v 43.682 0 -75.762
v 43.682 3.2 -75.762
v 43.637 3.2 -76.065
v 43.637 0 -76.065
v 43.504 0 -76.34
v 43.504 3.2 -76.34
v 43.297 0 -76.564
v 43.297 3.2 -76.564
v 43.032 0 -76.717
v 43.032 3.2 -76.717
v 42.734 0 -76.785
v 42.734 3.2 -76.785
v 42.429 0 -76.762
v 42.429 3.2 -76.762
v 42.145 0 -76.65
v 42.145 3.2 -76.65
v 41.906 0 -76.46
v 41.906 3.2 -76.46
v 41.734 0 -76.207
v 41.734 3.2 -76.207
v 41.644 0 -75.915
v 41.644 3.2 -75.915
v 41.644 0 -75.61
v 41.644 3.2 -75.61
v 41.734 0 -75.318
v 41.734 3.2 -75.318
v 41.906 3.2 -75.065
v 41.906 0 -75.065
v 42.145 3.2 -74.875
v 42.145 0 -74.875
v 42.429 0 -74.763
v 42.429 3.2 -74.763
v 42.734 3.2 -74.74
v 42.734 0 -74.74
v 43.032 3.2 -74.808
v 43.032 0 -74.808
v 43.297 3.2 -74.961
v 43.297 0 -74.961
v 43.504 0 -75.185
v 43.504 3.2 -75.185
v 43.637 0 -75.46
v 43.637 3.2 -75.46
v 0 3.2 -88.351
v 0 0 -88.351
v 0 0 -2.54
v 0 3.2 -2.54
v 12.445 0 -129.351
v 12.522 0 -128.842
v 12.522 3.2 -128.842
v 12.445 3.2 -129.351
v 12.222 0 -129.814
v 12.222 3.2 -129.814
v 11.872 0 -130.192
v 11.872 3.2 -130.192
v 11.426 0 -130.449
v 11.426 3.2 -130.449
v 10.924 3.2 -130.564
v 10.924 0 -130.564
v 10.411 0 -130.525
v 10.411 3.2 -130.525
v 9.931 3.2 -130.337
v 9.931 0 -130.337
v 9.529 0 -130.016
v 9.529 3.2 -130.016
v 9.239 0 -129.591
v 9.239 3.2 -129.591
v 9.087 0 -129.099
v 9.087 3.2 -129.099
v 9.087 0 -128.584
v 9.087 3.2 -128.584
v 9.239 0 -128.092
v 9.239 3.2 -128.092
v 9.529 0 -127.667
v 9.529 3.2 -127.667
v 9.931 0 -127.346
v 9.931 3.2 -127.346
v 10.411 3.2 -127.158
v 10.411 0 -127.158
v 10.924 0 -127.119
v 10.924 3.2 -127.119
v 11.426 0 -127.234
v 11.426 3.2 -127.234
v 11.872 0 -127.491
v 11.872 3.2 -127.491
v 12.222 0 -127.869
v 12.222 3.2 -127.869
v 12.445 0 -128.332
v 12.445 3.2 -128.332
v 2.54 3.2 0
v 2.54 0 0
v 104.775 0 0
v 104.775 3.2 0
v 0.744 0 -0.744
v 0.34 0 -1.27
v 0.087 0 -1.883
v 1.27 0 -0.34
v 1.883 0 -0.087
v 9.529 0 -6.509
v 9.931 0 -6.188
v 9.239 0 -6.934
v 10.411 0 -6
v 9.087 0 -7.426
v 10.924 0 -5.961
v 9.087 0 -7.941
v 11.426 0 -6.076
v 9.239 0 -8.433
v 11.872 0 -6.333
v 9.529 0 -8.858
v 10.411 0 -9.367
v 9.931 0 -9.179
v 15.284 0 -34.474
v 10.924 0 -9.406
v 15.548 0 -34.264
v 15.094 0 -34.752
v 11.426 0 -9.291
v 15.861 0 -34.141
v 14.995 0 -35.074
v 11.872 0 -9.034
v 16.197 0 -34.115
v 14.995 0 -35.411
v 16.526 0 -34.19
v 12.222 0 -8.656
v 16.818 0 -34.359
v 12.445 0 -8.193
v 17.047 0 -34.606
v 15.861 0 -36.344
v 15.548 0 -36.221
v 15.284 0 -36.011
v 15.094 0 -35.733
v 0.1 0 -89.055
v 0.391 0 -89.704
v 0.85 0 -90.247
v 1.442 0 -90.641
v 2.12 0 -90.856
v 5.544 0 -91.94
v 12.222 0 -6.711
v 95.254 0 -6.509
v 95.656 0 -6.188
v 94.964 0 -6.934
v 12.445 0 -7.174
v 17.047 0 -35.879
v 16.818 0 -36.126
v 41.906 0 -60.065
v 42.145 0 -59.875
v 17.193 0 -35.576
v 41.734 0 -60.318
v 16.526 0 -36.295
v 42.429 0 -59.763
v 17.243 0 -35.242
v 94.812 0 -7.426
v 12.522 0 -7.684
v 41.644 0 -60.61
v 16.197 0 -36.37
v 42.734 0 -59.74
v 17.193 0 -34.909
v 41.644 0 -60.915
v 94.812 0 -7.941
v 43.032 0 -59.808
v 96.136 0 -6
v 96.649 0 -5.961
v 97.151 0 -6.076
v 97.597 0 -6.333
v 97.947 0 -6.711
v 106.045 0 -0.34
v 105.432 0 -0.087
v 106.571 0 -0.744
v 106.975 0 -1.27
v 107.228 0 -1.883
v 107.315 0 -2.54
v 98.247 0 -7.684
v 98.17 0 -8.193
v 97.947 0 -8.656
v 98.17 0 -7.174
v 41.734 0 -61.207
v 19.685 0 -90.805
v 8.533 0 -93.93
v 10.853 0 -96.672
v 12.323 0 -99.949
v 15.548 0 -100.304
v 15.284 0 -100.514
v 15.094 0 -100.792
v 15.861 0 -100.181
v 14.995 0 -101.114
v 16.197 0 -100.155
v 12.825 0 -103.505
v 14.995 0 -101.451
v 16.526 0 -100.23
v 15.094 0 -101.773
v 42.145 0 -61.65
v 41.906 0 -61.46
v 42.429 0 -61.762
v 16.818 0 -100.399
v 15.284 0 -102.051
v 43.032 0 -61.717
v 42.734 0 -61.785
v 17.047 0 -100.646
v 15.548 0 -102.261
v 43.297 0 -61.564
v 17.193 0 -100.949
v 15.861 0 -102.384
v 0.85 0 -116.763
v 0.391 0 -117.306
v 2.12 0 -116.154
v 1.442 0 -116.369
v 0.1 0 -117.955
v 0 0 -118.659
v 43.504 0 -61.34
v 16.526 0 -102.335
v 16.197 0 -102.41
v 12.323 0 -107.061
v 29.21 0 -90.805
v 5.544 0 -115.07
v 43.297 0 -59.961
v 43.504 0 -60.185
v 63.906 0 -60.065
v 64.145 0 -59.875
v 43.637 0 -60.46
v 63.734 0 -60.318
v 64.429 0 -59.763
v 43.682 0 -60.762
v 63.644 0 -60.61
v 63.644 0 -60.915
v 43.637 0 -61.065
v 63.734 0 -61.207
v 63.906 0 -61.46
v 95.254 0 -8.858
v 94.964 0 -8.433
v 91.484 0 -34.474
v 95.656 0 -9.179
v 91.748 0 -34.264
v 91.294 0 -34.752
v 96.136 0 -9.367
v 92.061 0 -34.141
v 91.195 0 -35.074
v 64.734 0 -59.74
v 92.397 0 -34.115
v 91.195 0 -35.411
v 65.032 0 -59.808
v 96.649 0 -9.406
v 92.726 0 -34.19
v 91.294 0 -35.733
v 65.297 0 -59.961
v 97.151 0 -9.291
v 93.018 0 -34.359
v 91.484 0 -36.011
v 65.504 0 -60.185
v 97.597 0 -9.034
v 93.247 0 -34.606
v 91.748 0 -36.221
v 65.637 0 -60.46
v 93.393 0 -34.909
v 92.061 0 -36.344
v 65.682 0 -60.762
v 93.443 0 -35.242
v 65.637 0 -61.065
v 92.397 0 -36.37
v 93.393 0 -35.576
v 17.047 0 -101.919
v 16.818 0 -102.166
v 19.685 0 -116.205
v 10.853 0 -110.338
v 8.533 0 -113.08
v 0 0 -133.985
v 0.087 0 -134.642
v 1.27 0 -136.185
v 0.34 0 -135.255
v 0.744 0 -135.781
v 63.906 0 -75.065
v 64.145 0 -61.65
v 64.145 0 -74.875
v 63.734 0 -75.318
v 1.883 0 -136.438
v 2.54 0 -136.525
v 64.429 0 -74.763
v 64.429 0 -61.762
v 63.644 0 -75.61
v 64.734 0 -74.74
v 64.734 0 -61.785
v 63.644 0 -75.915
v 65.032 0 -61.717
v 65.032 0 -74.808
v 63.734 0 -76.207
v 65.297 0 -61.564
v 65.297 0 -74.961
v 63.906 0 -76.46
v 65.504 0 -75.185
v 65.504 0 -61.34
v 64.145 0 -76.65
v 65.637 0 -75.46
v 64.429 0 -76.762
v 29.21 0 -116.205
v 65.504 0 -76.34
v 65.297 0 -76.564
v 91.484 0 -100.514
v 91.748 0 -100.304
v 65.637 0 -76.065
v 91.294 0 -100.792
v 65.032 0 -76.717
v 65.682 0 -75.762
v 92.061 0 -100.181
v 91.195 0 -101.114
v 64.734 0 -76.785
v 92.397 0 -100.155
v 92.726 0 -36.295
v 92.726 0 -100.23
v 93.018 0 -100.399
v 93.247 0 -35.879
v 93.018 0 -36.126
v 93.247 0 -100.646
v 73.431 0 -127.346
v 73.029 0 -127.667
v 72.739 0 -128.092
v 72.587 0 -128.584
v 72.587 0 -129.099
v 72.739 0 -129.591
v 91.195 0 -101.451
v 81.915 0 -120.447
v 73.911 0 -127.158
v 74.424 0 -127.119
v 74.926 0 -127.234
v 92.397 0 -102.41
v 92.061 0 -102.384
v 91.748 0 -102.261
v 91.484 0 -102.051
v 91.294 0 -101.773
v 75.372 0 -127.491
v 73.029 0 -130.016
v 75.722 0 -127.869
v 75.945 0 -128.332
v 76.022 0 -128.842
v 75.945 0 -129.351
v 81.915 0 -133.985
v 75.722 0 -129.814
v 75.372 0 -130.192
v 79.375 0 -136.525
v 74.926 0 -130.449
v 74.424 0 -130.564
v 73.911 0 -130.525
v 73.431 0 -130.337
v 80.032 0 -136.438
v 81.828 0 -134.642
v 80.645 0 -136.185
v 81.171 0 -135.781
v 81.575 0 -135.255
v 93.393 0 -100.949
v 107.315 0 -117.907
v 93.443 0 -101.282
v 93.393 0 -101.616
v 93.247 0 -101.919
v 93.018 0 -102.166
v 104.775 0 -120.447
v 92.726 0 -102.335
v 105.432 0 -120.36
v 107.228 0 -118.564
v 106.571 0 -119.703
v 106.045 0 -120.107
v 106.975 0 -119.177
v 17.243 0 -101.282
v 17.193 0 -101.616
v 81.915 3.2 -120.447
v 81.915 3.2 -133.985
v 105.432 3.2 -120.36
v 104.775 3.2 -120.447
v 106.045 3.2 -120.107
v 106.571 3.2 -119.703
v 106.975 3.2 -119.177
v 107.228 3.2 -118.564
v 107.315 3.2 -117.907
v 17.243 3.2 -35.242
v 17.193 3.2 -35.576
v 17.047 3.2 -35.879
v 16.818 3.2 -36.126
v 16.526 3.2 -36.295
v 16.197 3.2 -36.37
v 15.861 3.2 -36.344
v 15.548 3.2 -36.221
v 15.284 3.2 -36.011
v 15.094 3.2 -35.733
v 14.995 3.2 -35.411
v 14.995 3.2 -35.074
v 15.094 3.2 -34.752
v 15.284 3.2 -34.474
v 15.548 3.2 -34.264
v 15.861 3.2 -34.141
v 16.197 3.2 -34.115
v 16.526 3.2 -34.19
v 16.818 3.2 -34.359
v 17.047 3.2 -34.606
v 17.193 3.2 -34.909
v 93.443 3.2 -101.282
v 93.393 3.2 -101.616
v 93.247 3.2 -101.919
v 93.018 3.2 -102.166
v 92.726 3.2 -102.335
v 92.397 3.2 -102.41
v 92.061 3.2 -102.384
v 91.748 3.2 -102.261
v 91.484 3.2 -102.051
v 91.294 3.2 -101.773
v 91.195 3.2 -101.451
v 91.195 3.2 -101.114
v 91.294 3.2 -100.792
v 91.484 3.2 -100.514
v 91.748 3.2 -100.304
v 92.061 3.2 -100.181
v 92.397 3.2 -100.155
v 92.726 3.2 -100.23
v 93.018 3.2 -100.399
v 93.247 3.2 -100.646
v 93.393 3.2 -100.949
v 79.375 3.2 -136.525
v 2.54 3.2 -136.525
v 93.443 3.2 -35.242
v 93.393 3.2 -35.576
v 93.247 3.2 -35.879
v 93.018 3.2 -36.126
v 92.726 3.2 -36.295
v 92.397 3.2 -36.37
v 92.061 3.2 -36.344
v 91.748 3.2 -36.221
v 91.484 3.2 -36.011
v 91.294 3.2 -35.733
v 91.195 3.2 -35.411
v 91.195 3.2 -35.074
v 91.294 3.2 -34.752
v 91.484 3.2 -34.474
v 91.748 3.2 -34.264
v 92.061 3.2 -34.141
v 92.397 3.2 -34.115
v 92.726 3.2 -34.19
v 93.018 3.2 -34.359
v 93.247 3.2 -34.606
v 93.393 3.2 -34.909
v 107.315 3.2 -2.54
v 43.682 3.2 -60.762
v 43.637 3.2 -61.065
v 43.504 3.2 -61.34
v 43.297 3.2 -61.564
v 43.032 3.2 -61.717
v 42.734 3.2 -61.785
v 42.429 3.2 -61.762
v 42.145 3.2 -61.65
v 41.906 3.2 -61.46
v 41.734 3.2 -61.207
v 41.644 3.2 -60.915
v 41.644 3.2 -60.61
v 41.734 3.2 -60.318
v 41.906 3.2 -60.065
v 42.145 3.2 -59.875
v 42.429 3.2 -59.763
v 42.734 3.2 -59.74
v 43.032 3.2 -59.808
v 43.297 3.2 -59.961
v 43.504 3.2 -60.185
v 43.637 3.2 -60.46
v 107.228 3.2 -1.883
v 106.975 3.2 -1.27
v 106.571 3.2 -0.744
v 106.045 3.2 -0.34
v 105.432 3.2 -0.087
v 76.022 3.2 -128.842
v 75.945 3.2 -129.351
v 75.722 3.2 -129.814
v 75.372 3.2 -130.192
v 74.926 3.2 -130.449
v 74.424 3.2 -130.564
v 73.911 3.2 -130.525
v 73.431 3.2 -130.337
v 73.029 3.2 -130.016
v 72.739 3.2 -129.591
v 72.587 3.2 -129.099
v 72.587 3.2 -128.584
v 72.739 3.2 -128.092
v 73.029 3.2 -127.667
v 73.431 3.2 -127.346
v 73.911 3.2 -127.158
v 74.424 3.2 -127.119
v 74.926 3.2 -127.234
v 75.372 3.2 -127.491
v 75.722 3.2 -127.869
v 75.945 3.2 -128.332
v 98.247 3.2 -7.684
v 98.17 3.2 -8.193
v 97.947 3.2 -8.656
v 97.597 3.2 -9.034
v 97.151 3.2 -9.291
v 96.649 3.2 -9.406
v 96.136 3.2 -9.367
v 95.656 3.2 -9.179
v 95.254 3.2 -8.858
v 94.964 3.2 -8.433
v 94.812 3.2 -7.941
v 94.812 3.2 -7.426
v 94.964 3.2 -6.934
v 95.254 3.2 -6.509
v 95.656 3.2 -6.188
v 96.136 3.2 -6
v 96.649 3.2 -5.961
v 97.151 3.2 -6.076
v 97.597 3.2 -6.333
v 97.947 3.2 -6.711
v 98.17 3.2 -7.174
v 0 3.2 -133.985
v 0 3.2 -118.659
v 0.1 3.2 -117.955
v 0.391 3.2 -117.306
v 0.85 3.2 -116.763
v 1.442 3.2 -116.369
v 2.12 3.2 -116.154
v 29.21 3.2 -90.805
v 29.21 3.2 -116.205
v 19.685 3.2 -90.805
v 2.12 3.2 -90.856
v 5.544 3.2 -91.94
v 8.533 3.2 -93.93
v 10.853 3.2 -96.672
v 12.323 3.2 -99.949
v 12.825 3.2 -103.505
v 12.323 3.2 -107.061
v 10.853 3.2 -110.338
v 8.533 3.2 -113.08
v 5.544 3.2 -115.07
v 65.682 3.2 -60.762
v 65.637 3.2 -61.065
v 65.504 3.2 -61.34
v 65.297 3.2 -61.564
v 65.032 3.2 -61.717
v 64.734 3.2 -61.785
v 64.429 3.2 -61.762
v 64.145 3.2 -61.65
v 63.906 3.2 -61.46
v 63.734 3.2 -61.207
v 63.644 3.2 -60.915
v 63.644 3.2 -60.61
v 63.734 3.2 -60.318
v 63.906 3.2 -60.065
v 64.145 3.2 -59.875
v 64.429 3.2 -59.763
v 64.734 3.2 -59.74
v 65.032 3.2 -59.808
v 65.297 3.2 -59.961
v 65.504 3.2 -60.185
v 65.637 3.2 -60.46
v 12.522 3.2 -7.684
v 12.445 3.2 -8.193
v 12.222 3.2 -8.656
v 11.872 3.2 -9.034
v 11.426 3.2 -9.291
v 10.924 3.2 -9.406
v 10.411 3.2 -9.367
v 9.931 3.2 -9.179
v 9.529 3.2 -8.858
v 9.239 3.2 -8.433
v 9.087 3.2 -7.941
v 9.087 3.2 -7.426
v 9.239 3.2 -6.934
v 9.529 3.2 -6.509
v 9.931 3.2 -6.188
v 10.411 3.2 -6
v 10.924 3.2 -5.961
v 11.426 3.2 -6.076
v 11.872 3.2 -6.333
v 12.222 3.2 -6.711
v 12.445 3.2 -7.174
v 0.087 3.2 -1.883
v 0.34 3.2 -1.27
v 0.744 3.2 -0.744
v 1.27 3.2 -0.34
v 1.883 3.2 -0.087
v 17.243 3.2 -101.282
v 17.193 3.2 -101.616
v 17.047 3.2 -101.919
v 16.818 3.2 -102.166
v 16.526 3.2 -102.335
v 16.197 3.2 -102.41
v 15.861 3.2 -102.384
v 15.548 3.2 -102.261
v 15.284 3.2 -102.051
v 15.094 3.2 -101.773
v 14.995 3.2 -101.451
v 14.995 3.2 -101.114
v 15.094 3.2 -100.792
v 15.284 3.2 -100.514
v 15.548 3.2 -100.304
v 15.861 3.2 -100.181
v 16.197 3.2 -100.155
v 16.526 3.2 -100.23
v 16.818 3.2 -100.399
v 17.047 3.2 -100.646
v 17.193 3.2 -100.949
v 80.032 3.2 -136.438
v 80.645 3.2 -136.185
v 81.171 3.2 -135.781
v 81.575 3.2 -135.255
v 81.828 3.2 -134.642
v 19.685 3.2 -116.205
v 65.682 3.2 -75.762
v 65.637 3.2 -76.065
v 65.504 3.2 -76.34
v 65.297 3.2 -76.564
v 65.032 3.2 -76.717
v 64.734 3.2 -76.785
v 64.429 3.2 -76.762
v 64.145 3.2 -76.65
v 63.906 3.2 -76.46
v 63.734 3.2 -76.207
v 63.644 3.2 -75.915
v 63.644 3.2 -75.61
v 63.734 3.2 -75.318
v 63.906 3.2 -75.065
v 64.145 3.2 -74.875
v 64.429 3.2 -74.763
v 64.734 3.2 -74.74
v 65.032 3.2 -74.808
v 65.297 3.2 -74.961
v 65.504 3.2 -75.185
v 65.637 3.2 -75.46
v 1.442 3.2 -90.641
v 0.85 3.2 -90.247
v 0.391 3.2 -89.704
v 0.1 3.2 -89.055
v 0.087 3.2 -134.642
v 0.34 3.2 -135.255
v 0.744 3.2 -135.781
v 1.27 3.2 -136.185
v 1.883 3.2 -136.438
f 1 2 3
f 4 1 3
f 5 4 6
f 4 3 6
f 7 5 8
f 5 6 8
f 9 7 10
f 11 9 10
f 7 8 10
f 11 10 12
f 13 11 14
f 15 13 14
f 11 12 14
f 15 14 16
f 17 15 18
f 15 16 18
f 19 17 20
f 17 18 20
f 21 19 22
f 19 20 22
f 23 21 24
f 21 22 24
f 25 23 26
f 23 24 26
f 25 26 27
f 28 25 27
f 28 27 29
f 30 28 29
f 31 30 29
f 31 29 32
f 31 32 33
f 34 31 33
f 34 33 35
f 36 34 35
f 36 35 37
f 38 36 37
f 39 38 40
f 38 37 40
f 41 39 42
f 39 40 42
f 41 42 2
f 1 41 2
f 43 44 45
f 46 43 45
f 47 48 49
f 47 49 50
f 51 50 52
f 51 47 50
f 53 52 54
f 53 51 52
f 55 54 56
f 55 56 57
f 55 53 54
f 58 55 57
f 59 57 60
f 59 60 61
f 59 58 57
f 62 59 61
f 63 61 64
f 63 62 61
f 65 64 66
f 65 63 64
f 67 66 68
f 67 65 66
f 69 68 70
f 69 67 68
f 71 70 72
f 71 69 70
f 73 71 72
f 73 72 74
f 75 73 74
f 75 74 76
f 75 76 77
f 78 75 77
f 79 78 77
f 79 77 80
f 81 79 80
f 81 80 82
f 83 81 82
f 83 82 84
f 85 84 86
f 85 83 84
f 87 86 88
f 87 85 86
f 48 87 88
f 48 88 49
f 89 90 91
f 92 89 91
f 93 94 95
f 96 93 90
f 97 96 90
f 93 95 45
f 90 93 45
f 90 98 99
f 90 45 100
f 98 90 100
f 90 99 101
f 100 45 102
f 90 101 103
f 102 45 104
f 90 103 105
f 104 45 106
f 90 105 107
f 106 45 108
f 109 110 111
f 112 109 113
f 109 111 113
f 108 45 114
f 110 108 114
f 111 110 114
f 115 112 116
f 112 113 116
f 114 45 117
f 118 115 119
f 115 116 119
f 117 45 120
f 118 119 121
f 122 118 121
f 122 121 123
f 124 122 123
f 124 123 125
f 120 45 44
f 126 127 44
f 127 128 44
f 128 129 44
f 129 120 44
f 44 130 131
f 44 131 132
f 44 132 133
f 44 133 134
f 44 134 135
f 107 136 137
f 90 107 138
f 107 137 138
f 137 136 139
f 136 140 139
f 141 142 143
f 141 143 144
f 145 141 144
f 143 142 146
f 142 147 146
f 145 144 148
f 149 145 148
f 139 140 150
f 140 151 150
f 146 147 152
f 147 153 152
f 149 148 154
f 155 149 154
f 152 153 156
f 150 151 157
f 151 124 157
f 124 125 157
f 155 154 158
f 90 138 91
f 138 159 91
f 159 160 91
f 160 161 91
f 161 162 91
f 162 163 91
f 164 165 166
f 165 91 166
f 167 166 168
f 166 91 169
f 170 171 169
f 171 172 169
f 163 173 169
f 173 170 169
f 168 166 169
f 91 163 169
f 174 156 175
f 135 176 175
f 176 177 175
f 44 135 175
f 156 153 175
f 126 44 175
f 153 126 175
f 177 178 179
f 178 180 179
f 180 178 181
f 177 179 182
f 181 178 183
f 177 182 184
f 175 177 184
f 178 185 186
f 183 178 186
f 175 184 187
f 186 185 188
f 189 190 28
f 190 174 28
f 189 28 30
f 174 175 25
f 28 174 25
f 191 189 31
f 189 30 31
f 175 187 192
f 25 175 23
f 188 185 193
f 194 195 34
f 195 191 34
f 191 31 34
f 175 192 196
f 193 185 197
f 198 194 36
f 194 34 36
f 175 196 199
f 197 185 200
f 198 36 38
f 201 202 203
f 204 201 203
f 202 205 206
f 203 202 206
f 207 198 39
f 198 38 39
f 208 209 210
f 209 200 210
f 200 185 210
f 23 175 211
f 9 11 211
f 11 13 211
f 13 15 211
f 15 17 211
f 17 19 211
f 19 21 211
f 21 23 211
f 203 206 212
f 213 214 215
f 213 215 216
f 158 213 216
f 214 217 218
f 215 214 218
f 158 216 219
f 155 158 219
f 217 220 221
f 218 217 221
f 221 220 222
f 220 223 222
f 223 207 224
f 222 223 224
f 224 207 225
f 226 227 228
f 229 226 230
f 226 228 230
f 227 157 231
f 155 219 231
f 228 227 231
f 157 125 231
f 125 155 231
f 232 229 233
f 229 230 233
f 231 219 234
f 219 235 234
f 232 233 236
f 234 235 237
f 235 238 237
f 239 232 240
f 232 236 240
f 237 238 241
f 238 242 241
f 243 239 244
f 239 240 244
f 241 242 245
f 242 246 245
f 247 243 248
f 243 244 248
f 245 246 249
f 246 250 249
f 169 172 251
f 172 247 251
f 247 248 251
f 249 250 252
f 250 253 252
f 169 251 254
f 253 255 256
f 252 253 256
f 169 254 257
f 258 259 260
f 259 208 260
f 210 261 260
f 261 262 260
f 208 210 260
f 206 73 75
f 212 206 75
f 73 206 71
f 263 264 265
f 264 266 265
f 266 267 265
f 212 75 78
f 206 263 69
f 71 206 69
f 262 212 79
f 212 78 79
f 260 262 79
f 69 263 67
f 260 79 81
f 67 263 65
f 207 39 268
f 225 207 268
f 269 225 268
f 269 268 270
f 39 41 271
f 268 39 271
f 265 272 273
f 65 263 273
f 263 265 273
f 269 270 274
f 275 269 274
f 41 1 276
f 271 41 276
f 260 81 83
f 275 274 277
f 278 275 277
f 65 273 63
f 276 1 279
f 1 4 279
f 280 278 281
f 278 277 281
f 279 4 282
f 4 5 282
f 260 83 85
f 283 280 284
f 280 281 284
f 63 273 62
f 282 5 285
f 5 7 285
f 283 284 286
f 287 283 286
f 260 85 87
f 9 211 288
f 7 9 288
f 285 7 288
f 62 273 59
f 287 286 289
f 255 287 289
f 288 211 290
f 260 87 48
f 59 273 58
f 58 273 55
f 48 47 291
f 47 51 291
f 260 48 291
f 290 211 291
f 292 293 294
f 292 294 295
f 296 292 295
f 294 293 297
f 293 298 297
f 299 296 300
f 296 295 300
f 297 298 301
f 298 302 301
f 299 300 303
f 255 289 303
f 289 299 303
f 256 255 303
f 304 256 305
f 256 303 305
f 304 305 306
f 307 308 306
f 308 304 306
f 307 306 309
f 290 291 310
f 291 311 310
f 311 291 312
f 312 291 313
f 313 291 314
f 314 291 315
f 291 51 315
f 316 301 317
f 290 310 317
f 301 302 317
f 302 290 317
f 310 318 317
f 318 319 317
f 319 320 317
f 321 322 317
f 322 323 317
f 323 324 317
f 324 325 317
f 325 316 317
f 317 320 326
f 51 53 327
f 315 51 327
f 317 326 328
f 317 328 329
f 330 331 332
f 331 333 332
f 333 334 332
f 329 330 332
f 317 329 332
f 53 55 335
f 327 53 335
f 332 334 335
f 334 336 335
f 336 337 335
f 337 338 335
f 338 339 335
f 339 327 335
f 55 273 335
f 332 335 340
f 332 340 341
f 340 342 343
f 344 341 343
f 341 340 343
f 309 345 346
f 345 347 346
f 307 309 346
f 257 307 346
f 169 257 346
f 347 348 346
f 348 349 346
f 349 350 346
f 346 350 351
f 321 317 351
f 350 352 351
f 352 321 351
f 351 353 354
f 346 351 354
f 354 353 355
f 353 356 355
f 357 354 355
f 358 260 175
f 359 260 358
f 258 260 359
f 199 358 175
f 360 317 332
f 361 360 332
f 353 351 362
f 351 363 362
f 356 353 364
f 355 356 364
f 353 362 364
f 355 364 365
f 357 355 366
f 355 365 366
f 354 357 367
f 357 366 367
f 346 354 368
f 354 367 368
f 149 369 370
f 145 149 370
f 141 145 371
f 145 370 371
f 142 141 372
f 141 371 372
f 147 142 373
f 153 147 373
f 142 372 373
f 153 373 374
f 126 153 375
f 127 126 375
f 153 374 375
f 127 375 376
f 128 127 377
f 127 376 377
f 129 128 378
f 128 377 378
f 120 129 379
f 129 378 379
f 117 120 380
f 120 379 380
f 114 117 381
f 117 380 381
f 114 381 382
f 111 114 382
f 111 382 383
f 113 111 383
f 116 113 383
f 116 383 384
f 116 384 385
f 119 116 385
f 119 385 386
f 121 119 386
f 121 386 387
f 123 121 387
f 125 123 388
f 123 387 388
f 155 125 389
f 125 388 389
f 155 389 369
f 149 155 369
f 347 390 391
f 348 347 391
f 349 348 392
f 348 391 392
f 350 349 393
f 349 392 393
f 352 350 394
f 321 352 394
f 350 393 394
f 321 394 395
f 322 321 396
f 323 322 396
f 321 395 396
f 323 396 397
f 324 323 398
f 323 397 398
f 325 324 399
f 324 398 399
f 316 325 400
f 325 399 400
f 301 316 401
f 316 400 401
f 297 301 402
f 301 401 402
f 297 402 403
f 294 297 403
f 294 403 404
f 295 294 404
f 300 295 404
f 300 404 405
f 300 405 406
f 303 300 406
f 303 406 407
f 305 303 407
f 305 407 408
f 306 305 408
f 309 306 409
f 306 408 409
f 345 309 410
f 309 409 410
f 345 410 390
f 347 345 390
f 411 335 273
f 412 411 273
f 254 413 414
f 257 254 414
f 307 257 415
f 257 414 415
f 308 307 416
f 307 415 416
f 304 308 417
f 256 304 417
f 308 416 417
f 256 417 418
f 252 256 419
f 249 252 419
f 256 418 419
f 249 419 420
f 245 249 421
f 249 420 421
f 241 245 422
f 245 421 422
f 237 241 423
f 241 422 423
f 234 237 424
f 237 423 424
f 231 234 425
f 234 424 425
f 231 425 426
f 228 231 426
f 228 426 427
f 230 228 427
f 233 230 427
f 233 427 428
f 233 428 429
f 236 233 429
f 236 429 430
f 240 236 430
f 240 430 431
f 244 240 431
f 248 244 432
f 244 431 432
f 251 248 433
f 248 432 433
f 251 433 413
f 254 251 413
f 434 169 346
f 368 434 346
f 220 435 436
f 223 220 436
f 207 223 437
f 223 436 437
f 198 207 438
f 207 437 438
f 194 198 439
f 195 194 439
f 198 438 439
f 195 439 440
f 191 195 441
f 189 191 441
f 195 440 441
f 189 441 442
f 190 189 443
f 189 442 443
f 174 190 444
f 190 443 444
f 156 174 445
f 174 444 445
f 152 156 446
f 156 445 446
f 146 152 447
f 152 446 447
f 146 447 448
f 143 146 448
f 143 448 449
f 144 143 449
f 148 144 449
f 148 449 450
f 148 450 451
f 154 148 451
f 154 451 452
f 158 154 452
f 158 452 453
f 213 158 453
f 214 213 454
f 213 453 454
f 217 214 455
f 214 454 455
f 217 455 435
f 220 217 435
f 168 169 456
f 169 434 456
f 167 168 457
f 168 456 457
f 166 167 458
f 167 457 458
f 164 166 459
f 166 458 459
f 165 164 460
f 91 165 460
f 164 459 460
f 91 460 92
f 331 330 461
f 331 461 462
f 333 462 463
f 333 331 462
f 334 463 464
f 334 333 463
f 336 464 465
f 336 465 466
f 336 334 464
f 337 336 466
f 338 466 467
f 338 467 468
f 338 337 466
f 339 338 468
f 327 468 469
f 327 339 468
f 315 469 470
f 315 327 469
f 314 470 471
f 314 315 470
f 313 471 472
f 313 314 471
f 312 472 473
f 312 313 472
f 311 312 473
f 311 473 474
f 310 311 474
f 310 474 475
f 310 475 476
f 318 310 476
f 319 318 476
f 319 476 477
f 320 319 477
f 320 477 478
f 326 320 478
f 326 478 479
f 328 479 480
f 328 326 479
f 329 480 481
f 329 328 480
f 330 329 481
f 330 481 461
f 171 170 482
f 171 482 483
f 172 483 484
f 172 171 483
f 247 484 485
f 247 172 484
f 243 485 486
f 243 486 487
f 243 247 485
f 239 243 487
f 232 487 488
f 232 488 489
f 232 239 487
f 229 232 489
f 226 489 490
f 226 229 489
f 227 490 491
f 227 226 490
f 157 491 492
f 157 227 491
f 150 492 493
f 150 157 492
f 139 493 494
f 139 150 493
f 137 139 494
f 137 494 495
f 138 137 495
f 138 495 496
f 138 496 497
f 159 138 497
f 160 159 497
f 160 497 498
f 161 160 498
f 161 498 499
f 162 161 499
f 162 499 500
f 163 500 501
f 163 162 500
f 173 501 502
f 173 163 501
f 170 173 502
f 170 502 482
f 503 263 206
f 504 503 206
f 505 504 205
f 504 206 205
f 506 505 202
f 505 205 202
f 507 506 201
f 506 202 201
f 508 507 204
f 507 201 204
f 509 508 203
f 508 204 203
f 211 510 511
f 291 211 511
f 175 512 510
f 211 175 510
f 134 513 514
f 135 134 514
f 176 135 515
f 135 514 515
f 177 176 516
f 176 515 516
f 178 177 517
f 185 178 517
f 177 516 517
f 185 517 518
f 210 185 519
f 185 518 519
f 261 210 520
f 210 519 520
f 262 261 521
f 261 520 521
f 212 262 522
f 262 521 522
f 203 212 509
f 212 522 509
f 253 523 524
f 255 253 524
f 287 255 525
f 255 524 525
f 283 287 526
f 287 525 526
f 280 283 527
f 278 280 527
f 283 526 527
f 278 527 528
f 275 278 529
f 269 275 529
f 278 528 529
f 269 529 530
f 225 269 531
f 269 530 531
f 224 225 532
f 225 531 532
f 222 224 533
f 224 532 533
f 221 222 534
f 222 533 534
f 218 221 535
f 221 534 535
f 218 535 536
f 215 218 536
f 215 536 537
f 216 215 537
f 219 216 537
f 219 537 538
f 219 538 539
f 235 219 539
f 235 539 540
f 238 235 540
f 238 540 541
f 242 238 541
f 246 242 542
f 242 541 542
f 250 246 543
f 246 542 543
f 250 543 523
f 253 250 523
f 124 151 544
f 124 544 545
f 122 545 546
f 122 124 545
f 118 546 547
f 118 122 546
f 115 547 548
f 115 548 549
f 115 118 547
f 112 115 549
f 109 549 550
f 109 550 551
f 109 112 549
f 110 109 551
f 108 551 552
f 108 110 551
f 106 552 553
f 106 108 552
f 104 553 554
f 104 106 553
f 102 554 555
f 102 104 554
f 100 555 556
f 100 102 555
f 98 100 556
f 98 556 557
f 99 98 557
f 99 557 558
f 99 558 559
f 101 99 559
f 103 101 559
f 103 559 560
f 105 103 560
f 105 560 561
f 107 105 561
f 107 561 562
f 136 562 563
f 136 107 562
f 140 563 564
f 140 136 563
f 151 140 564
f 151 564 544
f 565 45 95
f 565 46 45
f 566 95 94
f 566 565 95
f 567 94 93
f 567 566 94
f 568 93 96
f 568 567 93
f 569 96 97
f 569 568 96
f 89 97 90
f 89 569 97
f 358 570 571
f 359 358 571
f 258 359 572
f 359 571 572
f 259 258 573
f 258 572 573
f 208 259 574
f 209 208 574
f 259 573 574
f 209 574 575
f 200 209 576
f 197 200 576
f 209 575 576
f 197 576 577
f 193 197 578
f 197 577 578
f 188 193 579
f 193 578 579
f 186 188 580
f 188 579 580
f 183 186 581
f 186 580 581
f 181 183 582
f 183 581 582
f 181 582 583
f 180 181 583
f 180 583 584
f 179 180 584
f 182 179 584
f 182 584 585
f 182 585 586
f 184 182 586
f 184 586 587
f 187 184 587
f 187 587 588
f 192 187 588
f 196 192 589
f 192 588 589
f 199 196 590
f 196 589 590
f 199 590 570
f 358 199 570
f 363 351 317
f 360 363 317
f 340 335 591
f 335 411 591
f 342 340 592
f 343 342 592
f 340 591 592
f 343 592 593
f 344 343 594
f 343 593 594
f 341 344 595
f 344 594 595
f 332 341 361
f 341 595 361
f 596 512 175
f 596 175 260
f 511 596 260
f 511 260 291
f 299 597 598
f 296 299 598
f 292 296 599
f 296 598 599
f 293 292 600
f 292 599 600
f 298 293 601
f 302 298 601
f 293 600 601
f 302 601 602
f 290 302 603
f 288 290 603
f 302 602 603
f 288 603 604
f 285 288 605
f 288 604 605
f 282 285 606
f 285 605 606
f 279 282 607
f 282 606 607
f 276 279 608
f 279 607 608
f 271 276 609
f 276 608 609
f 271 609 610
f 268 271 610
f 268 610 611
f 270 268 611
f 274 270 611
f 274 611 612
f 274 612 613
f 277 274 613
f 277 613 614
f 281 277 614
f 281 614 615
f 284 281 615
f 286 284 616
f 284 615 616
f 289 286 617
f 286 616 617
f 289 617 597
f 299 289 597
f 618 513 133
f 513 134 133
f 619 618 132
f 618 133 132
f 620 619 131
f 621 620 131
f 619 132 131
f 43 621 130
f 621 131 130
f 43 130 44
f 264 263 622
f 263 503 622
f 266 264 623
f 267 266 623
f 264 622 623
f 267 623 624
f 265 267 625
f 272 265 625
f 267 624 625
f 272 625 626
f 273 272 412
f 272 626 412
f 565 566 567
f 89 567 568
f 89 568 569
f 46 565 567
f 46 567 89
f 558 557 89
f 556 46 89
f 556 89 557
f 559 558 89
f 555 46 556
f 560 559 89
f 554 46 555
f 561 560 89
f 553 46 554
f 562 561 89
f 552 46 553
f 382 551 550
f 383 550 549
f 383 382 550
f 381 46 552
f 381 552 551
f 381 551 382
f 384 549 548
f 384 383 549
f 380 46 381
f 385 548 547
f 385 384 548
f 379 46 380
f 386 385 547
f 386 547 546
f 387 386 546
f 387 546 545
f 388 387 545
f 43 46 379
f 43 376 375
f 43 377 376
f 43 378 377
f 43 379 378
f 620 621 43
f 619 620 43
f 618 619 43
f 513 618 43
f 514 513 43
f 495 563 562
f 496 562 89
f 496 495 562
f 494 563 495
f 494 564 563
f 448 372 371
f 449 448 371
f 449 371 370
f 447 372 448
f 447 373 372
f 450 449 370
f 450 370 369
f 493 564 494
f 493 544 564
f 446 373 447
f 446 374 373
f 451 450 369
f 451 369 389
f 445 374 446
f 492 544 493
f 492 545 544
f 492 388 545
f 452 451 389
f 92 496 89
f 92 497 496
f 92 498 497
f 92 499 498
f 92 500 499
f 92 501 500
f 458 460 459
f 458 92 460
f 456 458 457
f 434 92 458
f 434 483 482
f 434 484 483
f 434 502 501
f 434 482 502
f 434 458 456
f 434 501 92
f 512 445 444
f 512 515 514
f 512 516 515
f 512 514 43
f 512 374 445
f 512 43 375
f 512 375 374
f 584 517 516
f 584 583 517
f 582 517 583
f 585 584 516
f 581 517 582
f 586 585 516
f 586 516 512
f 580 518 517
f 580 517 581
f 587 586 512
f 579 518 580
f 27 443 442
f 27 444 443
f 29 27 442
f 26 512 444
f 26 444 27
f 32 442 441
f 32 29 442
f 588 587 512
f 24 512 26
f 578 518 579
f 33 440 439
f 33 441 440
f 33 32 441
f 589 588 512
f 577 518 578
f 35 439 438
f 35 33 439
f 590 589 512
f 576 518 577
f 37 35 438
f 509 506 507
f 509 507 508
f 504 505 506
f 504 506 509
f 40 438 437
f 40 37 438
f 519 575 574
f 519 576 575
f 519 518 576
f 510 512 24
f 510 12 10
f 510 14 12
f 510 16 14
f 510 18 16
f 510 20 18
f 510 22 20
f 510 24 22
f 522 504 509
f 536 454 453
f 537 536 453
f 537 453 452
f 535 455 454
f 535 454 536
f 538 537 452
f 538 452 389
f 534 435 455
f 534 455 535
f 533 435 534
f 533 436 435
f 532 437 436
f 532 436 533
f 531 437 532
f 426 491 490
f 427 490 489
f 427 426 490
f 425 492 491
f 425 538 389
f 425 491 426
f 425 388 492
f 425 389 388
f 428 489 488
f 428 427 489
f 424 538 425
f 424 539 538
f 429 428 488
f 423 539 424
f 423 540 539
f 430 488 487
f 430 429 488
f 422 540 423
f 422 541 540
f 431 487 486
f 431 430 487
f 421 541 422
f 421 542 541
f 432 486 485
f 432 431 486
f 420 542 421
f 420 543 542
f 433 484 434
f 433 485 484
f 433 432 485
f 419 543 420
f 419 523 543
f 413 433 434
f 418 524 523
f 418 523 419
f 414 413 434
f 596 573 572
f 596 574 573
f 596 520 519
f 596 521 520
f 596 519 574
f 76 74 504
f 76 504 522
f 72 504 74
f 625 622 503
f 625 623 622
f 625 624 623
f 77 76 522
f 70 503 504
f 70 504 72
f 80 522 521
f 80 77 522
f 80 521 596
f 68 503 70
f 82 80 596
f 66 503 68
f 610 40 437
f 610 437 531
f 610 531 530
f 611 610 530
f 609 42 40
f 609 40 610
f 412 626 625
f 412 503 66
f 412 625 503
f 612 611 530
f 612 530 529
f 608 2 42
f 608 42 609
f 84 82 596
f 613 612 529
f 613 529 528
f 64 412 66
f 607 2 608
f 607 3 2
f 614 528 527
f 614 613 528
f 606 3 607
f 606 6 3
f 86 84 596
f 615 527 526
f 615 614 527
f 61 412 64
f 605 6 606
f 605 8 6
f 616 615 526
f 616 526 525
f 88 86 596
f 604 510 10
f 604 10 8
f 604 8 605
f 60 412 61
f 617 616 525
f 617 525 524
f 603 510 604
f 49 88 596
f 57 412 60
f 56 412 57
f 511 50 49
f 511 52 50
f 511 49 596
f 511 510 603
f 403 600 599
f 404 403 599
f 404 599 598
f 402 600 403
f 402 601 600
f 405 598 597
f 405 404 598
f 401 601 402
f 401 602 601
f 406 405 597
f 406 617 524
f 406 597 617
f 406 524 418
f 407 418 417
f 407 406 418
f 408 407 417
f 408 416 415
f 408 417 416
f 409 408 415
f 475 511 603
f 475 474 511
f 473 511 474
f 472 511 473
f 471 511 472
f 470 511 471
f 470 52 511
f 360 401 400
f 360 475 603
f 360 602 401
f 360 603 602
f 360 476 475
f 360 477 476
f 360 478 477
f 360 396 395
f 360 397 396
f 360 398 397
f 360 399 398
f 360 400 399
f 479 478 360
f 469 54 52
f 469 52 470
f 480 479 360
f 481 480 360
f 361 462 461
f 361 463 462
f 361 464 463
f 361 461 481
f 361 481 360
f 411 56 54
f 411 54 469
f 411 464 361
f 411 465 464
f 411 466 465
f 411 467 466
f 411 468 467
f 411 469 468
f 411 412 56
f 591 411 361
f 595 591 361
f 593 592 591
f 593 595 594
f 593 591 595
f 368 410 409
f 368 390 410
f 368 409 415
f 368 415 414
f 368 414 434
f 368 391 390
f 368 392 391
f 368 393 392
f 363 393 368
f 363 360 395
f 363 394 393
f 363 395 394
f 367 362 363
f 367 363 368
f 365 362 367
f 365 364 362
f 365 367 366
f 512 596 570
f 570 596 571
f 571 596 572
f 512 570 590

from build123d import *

# Parameters (mm, degrees)
SKETCH1_R           = 1.7272
BOSS_EXTRUDE1_DEPTH = 3.2004
SKETCH2_W           = 9.525
SKETCH2_H           = 25.4
CUT_EXTRUDE1_DEPTH  = 3.2004
SKETCH3_R           = 1.1303
CUT_EXTRUDE2_DEPTH  = 3.2004
FILLET1_R           = 2.54
SKETCH4_R           = 1.02489
CUT_EXTRUDE3_DEPTH  = 3.2004


with BuildPart() as part:
    # Sketch1 → Boss-Extrude1 (new body)
    with BuildSketch(Plane(origin=(0, 0, 0), x_dir=(1, 0, 0), z_dir=(0, 1, 0))):
        Polygon((0, 136.525), (0, 0), (107.315, 0), (107.315, 120.4468), (81.915, 120.4468), (81.915, 136.525), align=None)
        with Locations((10.795, 128.8415)):
            Circle(SKETCH1_R, mode=Mode.SUBTRACT)
        with Locations((96.52, 7.6835)):
            Circle(SKETCH1_R, mode=Mode.SUBTRACT)
        with Locations((10.795, 7.6835)):
            Circle(SKETCH1_R, mode=Mode.SUBTRACT)
        with Locations((74.295, 128.8415)):
            Circle(SKETCH1_R, mode=Mode.SUBTRACT)
    extrude(amount=BOSS_EXTRUDE1_DEPTH)

    # Sketch2 → Cut-Extrude1 (cut)
    with BuildSketch(Plane(origin=(0, 3.2004, 0), x_dir=(1, 0, 0), z_dir=(0, 1, 0))):
        with Locations((24.4475, 103.505)):
            Rectangle(SKETCH2_W, SKETCH2_H)
        with BuildLine():
            Line((0, 116.330365836), (0, 90.679634164))
            ThreePointArc((0, 90.679634164), (12.825365836, 103.505), (0, 116.330365836))
        make_face()
    extrude(amount=-CUT_EXTRUDE1_DEPTH, mode=Mode.SUBTRACT)

    # Sketch3 → Cut-Extrude2 (cut)
    with BuildSketch(Plane(origin=(0, 3.2004, 0), x_dir=(1, 0, 0), z_dir=(0, 1, 0))):
        with Locations((92.312807391, 101.2825)):
            Circle(SKETCH3_R)
        with Locations((92.312807391, 35.2425)):
            Circle(SKETCH3_R)
        with Locations((16.112807391, 35.2425)):
            Circle(SKETCH3_R)
        with Locations((16.112807391, 101.2825)):
            Circle(SKETCH3_R)
    extrude(amount=-CUT_EXTRUDE2_DEPTH, mode=Mode.SUBTRACT)

    # Fillet1
    fillet1_edges = [part.edges().sort_by_distance(p)[0] for p in [
        (0, 1.6002, 0),
        (0, 1.6002, -136.525),
        (81.915, 1.6002, -136.525),
        (107.315, 1.6002, -120.4468),
        (107.315, 1.6002, 0),
        (0, 1.6002, -90.679634164),
        (0, 1.6002, -116.330365836),
    ]]
    fillet(fillet1_edges, radius=FILLET1_R)

    # Sketch4 → Cut-Extrude3 (cut)
    with BuildSketch(Plane(origin=(0, 3.2004, 0), x_dir=(1, 0, 0), z_dir=(0, 1, 0))):
        with Locations((64.6575, 75.7625)):
            Circle(SKETCH4_R)
        with Locations((64.6575, 60.7625)):
            Circle(SKETCH4_R)
        with Locations((42.6575, 75.7625)):
            Circle(SKETCH4_R)
        with Locations((42.6575, 60.7625)):
            Circle(SKETCH4_R)
    extrude(amount=-CUT_EXTRUDE3_DEPTH, mode=Mode.SUBTRACT)


solid = part.part
